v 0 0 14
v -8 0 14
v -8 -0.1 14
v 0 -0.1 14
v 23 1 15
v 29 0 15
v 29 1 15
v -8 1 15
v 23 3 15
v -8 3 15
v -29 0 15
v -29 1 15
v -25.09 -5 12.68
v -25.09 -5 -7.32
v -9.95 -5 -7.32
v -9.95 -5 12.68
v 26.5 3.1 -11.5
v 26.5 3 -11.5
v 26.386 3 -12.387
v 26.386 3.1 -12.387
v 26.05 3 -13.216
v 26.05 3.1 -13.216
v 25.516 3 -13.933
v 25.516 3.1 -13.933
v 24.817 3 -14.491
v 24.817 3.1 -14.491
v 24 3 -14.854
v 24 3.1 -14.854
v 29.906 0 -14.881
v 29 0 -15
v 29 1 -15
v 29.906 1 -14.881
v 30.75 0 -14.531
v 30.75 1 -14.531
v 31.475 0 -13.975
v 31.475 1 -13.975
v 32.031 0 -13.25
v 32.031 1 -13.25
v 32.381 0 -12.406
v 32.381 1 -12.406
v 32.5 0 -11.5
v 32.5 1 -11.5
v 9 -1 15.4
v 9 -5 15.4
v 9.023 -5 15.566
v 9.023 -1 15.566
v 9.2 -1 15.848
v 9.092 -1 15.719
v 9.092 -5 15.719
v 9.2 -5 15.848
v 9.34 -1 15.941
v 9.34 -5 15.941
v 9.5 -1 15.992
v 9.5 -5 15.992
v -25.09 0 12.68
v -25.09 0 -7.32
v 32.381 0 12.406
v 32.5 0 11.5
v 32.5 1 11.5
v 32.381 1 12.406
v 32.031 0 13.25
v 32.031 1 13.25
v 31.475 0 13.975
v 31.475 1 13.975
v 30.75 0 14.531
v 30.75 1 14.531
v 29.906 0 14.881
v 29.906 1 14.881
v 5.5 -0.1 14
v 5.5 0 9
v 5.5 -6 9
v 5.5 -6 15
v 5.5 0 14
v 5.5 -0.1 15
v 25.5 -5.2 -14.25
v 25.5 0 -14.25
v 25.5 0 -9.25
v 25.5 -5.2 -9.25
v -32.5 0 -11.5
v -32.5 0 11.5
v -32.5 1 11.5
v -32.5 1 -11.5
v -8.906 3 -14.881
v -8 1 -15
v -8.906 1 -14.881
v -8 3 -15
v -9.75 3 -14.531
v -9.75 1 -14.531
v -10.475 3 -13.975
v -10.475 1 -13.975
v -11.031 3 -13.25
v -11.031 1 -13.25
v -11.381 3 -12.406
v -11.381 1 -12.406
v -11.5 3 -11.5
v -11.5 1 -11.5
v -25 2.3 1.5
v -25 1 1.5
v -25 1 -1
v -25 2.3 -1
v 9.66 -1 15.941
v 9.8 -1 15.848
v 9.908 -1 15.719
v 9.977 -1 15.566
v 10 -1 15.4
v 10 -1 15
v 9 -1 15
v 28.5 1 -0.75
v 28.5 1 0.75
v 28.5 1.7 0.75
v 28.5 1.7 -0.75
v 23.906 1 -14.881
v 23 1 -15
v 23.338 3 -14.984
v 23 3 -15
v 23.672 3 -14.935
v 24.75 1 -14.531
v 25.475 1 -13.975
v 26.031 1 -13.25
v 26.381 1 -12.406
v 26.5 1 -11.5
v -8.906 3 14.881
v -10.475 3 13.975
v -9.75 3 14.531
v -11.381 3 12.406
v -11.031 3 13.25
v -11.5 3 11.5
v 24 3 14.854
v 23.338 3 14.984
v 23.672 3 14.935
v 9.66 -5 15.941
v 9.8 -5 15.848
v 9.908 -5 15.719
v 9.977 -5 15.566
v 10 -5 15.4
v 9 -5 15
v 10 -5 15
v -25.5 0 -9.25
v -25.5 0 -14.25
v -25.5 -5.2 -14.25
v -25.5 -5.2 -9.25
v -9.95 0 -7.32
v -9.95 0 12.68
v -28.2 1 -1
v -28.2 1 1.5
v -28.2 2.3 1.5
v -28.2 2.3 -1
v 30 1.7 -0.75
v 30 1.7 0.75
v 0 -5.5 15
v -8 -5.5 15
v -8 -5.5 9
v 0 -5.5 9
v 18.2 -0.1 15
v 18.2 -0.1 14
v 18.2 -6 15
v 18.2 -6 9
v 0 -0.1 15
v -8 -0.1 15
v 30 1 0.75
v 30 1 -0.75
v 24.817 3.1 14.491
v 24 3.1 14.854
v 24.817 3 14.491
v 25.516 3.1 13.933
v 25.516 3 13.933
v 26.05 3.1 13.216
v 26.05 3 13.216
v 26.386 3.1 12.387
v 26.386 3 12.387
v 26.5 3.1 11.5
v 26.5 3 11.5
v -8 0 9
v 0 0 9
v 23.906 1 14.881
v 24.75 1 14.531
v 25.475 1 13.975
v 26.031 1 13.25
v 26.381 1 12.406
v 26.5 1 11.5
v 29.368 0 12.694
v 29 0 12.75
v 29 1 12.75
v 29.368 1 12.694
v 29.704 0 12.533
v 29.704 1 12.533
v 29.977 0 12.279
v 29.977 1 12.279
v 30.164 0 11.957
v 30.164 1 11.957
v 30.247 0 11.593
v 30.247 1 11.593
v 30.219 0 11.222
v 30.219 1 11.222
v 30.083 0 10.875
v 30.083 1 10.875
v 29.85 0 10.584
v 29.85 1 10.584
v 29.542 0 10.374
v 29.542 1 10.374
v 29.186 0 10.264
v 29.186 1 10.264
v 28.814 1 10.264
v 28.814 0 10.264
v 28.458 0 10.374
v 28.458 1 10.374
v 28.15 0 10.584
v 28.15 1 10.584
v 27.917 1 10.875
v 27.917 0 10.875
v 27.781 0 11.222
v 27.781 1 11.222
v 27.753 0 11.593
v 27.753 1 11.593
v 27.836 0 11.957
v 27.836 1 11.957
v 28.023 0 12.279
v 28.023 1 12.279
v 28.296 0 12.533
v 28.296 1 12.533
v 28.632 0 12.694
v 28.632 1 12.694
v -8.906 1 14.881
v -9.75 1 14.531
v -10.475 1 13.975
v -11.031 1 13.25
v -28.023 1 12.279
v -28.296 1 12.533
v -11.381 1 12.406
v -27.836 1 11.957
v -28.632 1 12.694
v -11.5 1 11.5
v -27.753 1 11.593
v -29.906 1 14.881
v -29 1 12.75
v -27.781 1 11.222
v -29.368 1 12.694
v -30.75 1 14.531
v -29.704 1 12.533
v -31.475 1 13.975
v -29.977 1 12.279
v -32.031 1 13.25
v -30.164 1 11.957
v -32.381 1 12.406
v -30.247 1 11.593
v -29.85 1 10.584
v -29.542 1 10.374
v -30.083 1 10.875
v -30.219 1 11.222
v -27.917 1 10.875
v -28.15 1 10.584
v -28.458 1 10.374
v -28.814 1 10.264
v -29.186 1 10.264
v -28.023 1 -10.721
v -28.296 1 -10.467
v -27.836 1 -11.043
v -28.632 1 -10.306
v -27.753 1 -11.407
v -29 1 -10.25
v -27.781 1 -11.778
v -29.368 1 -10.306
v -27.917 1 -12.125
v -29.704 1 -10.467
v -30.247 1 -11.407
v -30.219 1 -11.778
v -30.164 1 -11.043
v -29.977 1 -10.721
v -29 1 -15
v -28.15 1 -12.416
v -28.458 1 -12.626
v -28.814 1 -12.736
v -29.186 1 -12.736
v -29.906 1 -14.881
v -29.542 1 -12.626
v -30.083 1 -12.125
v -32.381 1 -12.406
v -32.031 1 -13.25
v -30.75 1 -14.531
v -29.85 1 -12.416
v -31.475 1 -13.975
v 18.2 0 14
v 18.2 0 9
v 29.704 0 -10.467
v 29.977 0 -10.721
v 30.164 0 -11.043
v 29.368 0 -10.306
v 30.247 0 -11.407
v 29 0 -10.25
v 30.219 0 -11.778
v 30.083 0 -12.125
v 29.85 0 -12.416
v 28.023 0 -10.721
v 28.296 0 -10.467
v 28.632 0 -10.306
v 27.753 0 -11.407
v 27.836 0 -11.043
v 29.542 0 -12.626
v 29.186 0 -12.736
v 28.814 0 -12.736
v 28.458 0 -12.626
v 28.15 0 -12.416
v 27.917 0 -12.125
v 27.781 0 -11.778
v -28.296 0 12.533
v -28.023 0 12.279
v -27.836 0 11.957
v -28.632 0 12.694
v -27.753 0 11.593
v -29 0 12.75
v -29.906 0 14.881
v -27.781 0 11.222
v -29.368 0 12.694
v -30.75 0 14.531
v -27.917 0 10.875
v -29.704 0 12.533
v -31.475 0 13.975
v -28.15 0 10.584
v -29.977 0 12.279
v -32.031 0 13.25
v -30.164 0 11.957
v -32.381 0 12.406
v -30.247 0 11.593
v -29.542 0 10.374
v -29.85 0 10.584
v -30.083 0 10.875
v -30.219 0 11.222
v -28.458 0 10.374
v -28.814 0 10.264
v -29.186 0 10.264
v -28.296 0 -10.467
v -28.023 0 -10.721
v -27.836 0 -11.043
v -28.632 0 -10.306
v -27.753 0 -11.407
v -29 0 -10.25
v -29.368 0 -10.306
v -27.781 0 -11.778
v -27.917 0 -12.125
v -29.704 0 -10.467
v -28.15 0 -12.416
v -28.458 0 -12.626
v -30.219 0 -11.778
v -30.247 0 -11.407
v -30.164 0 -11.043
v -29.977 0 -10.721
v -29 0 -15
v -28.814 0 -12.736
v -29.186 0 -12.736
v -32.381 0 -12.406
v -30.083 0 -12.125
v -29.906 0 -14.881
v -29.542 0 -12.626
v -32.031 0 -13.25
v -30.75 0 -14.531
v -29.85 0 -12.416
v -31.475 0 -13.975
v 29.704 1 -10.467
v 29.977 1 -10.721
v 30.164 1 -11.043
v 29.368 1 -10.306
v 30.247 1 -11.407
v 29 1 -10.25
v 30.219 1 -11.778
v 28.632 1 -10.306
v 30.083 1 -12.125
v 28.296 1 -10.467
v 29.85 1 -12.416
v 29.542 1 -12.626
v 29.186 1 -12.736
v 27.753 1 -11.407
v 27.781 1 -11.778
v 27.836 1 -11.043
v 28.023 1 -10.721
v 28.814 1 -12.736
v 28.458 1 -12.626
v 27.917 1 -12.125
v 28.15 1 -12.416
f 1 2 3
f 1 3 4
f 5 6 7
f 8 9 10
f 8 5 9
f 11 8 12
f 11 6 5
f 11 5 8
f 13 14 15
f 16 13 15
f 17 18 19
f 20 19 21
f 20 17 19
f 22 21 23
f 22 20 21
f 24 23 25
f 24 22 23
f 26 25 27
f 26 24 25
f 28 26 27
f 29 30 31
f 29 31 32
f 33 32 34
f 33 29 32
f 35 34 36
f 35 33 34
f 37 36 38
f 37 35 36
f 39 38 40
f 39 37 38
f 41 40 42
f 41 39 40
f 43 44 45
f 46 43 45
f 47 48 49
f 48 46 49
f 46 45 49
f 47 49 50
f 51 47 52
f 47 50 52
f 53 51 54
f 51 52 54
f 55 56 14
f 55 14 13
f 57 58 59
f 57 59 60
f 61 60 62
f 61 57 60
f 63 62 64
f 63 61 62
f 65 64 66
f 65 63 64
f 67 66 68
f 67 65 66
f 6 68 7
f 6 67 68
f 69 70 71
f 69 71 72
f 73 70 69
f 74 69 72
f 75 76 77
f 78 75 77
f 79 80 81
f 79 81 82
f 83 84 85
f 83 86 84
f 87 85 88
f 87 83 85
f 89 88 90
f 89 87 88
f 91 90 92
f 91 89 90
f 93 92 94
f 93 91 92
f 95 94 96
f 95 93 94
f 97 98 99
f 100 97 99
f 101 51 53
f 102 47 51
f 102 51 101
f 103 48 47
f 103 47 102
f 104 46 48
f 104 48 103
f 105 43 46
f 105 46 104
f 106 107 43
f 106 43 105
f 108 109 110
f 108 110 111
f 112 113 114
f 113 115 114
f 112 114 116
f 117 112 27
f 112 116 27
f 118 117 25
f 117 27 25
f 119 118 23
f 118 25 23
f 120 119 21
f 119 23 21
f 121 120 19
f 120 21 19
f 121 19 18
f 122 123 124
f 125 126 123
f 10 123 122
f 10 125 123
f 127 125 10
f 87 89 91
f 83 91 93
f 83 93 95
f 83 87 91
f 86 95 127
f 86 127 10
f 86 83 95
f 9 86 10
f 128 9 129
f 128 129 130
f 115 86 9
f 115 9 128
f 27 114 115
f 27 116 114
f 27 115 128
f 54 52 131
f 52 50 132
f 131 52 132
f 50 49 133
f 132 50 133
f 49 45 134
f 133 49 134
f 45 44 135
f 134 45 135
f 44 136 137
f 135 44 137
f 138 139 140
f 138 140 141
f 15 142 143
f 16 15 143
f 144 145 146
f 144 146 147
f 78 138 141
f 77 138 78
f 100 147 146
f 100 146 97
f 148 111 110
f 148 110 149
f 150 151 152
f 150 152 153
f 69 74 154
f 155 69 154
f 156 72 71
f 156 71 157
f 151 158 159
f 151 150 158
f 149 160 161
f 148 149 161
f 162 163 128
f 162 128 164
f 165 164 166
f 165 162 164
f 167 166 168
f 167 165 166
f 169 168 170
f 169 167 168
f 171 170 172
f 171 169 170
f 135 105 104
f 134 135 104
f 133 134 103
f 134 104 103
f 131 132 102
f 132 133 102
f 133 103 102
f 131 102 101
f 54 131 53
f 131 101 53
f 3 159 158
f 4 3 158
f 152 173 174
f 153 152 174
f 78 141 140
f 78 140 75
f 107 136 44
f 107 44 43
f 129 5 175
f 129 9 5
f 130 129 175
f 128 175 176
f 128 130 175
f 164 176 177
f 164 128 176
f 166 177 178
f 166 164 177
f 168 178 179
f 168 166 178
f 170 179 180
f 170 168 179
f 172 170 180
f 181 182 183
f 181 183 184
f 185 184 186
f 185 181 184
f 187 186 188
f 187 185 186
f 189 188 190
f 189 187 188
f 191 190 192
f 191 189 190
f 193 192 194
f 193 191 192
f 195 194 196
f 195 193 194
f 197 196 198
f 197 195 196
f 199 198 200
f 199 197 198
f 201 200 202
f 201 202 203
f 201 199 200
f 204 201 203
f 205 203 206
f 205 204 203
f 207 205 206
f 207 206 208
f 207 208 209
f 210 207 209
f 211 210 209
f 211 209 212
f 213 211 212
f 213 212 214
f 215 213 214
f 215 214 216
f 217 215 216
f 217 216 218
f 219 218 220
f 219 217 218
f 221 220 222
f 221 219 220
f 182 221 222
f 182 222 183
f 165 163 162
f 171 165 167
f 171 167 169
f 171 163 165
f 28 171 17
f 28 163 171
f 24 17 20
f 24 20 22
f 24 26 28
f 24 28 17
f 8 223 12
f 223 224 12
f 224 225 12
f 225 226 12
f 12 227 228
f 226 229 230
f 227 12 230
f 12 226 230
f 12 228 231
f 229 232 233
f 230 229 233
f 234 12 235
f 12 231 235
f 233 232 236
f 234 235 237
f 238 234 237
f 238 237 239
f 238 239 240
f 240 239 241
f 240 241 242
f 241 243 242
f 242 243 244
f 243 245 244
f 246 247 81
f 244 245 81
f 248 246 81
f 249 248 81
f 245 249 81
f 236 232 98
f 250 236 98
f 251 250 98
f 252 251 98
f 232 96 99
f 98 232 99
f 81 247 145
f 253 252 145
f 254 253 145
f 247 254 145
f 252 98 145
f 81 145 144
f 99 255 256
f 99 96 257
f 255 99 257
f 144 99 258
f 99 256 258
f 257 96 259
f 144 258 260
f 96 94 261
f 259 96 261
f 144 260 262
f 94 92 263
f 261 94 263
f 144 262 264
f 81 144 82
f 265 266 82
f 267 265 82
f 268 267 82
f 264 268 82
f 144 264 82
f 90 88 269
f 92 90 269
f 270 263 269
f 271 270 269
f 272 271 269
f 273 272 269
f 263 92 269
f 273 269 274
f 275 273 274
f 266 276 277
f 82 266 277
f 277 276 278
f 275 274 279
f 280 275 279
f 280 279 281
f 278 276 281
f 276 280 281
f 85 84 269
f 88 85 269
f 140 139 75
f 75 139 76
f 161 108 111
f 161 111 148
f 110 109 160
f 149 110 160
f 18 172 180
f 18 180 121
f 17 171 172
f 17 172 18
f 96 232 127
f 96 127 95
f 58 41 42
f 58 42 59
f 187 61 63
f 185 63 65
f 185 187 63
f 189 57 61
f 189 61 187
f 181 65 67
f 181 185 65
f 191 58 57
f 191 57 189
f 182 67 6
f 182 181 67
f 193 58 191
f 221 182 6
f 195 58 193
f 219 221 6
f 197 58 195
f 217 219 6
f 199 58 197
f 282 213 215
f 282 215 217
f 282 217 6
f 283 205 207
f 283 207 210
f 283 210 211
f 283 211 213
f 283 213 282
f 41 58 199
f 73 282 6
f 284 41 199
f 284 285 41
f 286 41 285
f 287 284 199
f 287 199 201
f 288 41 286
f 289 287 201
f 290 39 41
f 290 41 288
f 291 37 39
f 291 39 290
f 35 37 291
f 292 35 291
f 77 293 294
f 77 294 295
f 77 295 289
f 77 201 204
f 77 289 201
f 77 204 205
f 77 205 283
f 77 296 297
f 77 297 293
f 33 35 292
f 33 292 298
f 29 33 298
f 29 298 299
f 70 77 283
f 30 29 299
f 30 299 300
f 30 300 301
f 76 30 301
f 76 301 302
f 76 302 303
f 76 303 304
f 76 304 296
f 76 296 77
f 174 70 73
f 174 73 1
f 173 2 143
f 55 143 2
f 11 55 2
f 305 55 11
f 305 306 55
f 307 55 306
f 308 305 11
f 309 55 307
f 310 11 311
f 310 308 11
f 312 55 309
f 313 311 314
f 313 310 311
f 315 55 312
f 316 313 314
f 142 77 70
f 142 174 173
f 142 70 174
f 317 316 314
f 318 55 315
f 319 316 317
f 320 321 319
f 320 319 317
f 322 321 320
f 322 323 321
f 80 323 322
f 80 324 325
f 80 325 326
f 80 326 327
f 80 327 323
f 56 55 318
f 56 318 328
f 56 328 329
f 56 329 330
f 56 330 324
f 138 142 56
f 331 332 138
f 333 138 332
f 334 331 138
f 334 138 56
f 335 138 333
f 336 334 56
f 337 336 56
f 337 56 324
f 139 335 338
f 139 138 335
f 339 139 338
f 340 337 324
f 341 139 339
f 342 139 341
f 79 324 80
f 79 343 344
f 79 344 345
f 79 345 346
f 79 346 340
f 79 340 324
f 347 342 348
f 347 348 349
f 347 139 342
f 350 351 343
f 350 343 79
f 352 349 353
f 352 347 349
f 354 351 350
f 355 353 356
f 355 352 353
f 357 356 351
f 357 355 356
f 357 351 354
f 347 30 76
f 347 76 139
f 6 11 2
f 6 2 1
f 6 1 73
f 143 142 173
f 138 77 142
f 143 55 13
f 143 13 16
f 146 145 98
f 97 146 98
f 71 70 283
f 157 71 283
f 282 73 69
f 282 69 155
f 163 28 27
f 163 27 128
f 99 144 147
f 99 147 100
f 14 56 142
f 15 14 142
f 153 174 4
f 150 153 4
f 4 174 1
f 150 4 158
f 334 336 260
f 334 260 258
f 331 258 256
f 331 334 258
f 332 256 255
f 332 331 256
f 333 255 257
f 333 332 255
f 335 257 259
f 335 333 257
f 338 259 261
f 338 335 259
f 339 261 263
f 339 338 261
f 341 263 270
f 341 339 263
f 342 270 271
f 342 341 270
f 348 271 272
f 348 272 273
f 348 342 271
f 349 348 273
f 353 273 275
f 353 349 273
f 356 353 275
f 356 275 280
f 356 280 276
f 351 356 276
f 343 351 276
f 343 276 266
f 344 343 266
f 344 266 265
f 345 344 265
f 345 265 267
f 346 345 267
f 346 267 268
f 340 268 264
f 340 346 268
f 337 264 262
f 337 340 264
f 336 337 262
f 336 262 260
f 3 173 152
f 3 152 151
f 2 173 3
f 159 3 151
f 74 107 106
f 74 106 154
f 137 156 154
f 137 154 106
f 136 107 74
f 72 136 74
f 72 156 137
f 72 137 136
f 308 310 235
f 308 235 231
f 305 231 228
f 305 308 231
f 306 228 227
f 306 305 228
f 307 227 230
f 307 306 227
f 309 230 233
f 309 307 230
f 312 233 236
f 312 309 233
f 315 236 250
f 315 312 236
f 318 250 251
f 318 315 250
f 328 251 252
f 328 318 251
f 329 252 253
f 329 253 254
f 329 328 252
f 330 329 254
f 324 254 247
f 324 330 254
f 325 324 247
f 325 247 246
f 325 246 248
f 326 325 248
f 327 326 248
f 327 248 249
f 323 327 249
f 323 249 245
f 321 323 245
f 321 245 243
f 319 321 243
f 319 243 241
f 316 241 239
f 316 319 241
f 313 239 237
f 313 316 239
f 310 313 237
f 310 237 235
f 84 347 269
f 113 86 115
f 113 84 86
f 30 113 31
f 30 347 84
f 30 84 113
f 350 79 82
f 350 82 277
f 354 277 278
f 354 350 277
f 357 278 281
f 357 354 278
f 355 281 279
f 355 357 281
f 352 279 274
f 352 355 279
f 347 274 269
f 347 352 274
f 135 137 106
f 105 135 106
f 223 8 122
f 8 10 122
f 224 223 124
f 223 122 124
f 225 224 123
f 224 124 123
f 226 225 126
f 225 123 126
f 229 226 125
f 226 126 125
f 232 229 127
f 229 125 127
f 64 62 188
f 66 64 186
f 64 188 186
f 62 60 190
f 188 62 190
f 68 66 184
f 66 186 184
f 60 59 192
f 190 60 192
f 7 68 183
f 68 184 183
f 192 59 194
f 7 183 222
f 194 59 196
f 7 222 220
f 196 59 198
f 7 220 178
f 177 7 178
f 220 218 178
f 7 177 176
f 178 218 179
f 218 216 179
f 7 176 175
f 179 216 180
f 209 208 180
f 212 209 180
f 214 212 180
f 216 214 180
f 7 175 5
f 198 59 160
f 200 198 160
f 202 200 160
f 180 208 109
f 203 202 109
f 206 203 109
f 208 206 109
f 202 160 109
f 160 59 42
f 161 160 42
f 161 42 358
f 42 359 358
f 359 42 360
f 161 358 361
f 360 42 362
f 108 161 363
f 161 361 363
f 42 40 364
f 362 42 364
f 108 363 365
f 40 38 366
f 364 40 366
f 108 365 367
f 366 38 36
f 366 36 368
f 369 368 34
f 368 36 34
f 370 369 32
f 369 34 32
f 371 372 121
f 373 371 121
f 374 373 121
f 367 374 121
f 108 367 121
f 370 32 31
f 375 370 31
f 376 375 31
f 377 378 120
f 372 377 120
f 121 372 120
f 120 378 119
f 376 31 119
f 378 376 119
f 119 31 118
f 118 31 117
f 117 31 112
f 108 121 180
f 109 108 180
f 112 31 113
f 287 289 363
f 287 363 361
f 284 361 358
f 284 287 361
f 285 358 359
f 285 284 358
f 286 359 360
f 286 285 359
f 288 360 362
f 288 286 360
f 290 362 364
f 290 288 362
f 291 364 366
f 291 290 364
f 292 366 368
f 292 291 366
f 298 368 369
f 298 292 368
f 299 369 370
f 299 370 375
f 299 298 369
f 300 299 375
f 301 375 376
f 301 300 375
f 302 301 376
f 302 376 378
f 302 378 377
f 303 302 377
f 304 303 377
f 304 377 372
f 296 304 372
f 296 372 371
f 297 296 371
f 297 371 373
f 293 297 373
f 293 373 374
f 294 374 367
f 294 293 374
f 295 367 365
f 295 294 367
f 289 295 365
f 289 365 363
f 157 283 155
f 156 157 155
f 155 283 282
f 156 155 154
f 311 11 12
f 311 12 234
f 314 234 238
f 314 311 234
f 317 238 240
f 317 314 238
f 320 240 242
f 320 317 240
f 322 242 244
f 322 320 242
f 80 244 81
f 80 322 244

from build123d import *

# Parameters (mm, degrees)
SKETCH_1_R         = 1.25
BOARD_DEPTH        = 1
SKETCH_2_W         = 38
SKETCH_2_H         = 30
SCREEN_DEPTH       = 2
SCREEN_RADIUS_R    = 3.5
SCREEN_TOP_START   = 0.1
SCREEN_TOP_DEPTH   = 0.1
SKETCH_3_W         = 51
SKETCH_3_H         = 5
PLUG_DEPTH         = 5.2
SKETCH_4_W         = 15.14
SKETCH_4_H         = 20
SPEAKER_DEPTH      = 5
SKETCH_10_W        = 8
SKETCH_10_H        = 6
SPEAKER2PLUG_DEPTH = 5.5
SKETCH_5_W         = 12.7
SKETCH_5_H         = 6
BUTTON_DEPTH       = 6
SKETCH_6_W         = 1
SKETCH_6_H         = 4
BUTTON_TAP_DEPTH   = 1
TAP_RADIUS_R       = 0.6
SKETCH_7_W         = 1.5
SKETCH_7_H         = 1.5
RGB_LED_DEPTH      = 0.7
SKETCH_8_W         = 3.2
SKETCH_8_H         = 2.5
MIC_DEPTH          = 1.3
SKETCH_11_W        = 26.2
SKETCH_11_H        = 0.1
SPLIT_2_DEPTH      = 1


with BuildPart() as part:
    # 草图1 → board (new body)
    with BuildSketch(Plane(origin=(0, 0, 0), x_dir=(1, 0, 0), z_dir=(0, 1, 0))):
        with BuildLine():
            Line((-29, 15), (29, 15))
            ThreePointArc((29, 15), (31.474873734, 13.974873734), (32.5, 11.5))
            Line((32.5, 11.5), (32.5, -11.5))
            ThreePointArc((32.5, -11.5), (31.474873734, -13.974873734), (29, -15))
            Line((29, -15), (-29, -15))
            ThreePointArc((-29, -15), (-31.474873734, -13.974873734), (-32.5, -11.5))
            Line((-32.5, -11.5), (-32.5, 11.5))
            ThreePointArc((-32.5, 11.5), (-31.474873734, 13.974873734), (-29, 15))
        make_face()
        with Locations(Location((-29, 11.5, 0), (0, 0, 270))):
            Circle(SKETCH_1_R, mode=Mode.SUBTRACT)
        with Locations(Location((29, 11.5, 0), (0, 0, 270))):
            Circle(SKETCH_1_R, mode=Mode.SUBTRACT)
        with Locations(Location((-29, -11.5, 0), (0, 0, 270))):
            Circle(SKETCH_1_R, mode=Mode.SUBTRACT)
        with Locations(Location((29, -11.5, 0), (0, 0, 270))):
            Circle(SKETCH_1_R, mode=Mode.SUBTRACT)
    extrude(amount=BOARD_DEPTH)

    # 草图2 → screen (add)
    with BuildSketch(Plane(origin=(0, 1, 0), x_dir=(1, 0, 0), z_dir=(0, 1, 0))):
        with Locations((7.5, 0)):
            Rectangle(SKETCH_2_W, SKETCH_2_H)
    extrude(amount=SCREEN_DEPTH)

    # screen-radius
    screen_radius_edges = [part.edges().sort_by_distance(p)[0] for p in [
        (-11.5, 2, -15),
        (-11.5, 2, 15),
        (26.5, 2, 15),
        (26.5, 2, -15),
    ]]
    fillet(screen_radius_edges, radius=SCREEN_RADIUS_R)

    # 草图9 → screen-top (add)
    with BuildSketch(Plane(origin=(0, 3, 0), x_dir=(1, 0, 0), z_dir=(0, 1, 0)).offset(SCREEN_TOP_START)):
        with BuildLine():
            Line((26.5, -11.5), (26.5, 11.5))
            ThreePointArc((26.5, 11.5), (25.80624304, 13.591650066), (24, 14.854101966))
            Line((24, 14.854101966), (24, -14.854101966))
            ThreePointArc((24, -14.854101966), (25.80624304, -13.591650066), (26.5, -11.5))
        make_face()
    extrude(amount=-SCREEN_TOP_DEPTH)

    # 草图3 → plug (add)
    with BuildSketch(Plane.XZ):
        with Locations((0, -11.75)):
            Rectangle(SKETCH_3_W, SKETCH_3_H)
    extrude(amount=PLUG_DEPTH)

    # 草图4 → speaker (add)
    with BuildSketch(Plane.XZ):
        with Locations((-17.52, 2.68)):
            Rectangle(SKETCH_4_W, SKETCH_4_H)
    extrude(amount=SPEAKER_DEPTH)

    # 草图10 → speaker2plug (add)
    with BuildSketch(Plane.XZ):
        with Locations((-4, 12)):
            Rectangle(SKETCH_10_W, SKETCH_10_H)
    extrude(amount=SPEAKER2PLUG_DEPTH)

    # 草图5 → button (add)
    with BuildSketch(Plane.XZ):
        with Locations((11.85, 12)):
            Rectangle(SKETCH_5_W, SKETCH_5_H)
    extrude(amount=BUTTON_DEPTH)

    # 草图6 → button-tap (add)
    with BuildSketch(Plane.XY.offset(15)):
        with Locations((9.5, -3)):
            Rectangle(SKETCH_6_W, SKETCH_6_H)
    extrude(amount=BUTTON_TAP_DEPTH)

    # tap-radius
    # the kernel refuses this fillet: 0.6 mm, written as the material it takes off along each edge
    with BuildSketch(Plane(origin=(10, 0.5, 16), x_dir=(0, 0, -1), z_dir=(0, -1, 0)), Plane(origin=(9, -6.5, 16), x_dir=(0, 0, -1), z_dir=(0, 1, 0))) as tap_radius_piece_1:
        with BuildLine():
            CenterArc((TAP_RADIUS_R, -TAP_RADIUS_R), TAP_RADIUS_R, 90, 90)
            Line((0, -TAP_RADIUS_R), (0, 0))
            Line((0, 0), (TAP_RADIUS_R, 0))
        make_face()
    extrude(amount=7, mode=Mode.SUBTRACT)

    # 草图7 → rgb-led (add)
    with BuildSketch(Plane(origin=(0, 1, 0), x_dir=(1, 0, 0), z_dir=(0, 1, 0))):
        with Locations((29.25, 0)):
            Rectangle(SKETCH_7_W, SKETCH_7_H)
    extrude(amount=RGB_LED_DEPTH)

    # 草图8 → mic (add)
    with BuildSketch(Plane(origin=(0, 1, 0), x_dir=(1, 0, 0), z_dir=(0, 1, 0))):
        with Locations((-26.6, -0.25)):
            Rectangle(SKETCH_8_W, SKETCH_8_H)
    extrude(amount=MIC_DEPTH)

    # 草图11 → split 2 (cut)
    with BuildSketch(Plane.XY.offset(15)):
        with Locations((5.1, -0.05)):
            Rectangle(SKETCH_11_W, SKETCH_11_H)
    extrude(amount=-SPLIT_2_DEPTH, mode=Mode.SUBTRACT)


solid = part.part
